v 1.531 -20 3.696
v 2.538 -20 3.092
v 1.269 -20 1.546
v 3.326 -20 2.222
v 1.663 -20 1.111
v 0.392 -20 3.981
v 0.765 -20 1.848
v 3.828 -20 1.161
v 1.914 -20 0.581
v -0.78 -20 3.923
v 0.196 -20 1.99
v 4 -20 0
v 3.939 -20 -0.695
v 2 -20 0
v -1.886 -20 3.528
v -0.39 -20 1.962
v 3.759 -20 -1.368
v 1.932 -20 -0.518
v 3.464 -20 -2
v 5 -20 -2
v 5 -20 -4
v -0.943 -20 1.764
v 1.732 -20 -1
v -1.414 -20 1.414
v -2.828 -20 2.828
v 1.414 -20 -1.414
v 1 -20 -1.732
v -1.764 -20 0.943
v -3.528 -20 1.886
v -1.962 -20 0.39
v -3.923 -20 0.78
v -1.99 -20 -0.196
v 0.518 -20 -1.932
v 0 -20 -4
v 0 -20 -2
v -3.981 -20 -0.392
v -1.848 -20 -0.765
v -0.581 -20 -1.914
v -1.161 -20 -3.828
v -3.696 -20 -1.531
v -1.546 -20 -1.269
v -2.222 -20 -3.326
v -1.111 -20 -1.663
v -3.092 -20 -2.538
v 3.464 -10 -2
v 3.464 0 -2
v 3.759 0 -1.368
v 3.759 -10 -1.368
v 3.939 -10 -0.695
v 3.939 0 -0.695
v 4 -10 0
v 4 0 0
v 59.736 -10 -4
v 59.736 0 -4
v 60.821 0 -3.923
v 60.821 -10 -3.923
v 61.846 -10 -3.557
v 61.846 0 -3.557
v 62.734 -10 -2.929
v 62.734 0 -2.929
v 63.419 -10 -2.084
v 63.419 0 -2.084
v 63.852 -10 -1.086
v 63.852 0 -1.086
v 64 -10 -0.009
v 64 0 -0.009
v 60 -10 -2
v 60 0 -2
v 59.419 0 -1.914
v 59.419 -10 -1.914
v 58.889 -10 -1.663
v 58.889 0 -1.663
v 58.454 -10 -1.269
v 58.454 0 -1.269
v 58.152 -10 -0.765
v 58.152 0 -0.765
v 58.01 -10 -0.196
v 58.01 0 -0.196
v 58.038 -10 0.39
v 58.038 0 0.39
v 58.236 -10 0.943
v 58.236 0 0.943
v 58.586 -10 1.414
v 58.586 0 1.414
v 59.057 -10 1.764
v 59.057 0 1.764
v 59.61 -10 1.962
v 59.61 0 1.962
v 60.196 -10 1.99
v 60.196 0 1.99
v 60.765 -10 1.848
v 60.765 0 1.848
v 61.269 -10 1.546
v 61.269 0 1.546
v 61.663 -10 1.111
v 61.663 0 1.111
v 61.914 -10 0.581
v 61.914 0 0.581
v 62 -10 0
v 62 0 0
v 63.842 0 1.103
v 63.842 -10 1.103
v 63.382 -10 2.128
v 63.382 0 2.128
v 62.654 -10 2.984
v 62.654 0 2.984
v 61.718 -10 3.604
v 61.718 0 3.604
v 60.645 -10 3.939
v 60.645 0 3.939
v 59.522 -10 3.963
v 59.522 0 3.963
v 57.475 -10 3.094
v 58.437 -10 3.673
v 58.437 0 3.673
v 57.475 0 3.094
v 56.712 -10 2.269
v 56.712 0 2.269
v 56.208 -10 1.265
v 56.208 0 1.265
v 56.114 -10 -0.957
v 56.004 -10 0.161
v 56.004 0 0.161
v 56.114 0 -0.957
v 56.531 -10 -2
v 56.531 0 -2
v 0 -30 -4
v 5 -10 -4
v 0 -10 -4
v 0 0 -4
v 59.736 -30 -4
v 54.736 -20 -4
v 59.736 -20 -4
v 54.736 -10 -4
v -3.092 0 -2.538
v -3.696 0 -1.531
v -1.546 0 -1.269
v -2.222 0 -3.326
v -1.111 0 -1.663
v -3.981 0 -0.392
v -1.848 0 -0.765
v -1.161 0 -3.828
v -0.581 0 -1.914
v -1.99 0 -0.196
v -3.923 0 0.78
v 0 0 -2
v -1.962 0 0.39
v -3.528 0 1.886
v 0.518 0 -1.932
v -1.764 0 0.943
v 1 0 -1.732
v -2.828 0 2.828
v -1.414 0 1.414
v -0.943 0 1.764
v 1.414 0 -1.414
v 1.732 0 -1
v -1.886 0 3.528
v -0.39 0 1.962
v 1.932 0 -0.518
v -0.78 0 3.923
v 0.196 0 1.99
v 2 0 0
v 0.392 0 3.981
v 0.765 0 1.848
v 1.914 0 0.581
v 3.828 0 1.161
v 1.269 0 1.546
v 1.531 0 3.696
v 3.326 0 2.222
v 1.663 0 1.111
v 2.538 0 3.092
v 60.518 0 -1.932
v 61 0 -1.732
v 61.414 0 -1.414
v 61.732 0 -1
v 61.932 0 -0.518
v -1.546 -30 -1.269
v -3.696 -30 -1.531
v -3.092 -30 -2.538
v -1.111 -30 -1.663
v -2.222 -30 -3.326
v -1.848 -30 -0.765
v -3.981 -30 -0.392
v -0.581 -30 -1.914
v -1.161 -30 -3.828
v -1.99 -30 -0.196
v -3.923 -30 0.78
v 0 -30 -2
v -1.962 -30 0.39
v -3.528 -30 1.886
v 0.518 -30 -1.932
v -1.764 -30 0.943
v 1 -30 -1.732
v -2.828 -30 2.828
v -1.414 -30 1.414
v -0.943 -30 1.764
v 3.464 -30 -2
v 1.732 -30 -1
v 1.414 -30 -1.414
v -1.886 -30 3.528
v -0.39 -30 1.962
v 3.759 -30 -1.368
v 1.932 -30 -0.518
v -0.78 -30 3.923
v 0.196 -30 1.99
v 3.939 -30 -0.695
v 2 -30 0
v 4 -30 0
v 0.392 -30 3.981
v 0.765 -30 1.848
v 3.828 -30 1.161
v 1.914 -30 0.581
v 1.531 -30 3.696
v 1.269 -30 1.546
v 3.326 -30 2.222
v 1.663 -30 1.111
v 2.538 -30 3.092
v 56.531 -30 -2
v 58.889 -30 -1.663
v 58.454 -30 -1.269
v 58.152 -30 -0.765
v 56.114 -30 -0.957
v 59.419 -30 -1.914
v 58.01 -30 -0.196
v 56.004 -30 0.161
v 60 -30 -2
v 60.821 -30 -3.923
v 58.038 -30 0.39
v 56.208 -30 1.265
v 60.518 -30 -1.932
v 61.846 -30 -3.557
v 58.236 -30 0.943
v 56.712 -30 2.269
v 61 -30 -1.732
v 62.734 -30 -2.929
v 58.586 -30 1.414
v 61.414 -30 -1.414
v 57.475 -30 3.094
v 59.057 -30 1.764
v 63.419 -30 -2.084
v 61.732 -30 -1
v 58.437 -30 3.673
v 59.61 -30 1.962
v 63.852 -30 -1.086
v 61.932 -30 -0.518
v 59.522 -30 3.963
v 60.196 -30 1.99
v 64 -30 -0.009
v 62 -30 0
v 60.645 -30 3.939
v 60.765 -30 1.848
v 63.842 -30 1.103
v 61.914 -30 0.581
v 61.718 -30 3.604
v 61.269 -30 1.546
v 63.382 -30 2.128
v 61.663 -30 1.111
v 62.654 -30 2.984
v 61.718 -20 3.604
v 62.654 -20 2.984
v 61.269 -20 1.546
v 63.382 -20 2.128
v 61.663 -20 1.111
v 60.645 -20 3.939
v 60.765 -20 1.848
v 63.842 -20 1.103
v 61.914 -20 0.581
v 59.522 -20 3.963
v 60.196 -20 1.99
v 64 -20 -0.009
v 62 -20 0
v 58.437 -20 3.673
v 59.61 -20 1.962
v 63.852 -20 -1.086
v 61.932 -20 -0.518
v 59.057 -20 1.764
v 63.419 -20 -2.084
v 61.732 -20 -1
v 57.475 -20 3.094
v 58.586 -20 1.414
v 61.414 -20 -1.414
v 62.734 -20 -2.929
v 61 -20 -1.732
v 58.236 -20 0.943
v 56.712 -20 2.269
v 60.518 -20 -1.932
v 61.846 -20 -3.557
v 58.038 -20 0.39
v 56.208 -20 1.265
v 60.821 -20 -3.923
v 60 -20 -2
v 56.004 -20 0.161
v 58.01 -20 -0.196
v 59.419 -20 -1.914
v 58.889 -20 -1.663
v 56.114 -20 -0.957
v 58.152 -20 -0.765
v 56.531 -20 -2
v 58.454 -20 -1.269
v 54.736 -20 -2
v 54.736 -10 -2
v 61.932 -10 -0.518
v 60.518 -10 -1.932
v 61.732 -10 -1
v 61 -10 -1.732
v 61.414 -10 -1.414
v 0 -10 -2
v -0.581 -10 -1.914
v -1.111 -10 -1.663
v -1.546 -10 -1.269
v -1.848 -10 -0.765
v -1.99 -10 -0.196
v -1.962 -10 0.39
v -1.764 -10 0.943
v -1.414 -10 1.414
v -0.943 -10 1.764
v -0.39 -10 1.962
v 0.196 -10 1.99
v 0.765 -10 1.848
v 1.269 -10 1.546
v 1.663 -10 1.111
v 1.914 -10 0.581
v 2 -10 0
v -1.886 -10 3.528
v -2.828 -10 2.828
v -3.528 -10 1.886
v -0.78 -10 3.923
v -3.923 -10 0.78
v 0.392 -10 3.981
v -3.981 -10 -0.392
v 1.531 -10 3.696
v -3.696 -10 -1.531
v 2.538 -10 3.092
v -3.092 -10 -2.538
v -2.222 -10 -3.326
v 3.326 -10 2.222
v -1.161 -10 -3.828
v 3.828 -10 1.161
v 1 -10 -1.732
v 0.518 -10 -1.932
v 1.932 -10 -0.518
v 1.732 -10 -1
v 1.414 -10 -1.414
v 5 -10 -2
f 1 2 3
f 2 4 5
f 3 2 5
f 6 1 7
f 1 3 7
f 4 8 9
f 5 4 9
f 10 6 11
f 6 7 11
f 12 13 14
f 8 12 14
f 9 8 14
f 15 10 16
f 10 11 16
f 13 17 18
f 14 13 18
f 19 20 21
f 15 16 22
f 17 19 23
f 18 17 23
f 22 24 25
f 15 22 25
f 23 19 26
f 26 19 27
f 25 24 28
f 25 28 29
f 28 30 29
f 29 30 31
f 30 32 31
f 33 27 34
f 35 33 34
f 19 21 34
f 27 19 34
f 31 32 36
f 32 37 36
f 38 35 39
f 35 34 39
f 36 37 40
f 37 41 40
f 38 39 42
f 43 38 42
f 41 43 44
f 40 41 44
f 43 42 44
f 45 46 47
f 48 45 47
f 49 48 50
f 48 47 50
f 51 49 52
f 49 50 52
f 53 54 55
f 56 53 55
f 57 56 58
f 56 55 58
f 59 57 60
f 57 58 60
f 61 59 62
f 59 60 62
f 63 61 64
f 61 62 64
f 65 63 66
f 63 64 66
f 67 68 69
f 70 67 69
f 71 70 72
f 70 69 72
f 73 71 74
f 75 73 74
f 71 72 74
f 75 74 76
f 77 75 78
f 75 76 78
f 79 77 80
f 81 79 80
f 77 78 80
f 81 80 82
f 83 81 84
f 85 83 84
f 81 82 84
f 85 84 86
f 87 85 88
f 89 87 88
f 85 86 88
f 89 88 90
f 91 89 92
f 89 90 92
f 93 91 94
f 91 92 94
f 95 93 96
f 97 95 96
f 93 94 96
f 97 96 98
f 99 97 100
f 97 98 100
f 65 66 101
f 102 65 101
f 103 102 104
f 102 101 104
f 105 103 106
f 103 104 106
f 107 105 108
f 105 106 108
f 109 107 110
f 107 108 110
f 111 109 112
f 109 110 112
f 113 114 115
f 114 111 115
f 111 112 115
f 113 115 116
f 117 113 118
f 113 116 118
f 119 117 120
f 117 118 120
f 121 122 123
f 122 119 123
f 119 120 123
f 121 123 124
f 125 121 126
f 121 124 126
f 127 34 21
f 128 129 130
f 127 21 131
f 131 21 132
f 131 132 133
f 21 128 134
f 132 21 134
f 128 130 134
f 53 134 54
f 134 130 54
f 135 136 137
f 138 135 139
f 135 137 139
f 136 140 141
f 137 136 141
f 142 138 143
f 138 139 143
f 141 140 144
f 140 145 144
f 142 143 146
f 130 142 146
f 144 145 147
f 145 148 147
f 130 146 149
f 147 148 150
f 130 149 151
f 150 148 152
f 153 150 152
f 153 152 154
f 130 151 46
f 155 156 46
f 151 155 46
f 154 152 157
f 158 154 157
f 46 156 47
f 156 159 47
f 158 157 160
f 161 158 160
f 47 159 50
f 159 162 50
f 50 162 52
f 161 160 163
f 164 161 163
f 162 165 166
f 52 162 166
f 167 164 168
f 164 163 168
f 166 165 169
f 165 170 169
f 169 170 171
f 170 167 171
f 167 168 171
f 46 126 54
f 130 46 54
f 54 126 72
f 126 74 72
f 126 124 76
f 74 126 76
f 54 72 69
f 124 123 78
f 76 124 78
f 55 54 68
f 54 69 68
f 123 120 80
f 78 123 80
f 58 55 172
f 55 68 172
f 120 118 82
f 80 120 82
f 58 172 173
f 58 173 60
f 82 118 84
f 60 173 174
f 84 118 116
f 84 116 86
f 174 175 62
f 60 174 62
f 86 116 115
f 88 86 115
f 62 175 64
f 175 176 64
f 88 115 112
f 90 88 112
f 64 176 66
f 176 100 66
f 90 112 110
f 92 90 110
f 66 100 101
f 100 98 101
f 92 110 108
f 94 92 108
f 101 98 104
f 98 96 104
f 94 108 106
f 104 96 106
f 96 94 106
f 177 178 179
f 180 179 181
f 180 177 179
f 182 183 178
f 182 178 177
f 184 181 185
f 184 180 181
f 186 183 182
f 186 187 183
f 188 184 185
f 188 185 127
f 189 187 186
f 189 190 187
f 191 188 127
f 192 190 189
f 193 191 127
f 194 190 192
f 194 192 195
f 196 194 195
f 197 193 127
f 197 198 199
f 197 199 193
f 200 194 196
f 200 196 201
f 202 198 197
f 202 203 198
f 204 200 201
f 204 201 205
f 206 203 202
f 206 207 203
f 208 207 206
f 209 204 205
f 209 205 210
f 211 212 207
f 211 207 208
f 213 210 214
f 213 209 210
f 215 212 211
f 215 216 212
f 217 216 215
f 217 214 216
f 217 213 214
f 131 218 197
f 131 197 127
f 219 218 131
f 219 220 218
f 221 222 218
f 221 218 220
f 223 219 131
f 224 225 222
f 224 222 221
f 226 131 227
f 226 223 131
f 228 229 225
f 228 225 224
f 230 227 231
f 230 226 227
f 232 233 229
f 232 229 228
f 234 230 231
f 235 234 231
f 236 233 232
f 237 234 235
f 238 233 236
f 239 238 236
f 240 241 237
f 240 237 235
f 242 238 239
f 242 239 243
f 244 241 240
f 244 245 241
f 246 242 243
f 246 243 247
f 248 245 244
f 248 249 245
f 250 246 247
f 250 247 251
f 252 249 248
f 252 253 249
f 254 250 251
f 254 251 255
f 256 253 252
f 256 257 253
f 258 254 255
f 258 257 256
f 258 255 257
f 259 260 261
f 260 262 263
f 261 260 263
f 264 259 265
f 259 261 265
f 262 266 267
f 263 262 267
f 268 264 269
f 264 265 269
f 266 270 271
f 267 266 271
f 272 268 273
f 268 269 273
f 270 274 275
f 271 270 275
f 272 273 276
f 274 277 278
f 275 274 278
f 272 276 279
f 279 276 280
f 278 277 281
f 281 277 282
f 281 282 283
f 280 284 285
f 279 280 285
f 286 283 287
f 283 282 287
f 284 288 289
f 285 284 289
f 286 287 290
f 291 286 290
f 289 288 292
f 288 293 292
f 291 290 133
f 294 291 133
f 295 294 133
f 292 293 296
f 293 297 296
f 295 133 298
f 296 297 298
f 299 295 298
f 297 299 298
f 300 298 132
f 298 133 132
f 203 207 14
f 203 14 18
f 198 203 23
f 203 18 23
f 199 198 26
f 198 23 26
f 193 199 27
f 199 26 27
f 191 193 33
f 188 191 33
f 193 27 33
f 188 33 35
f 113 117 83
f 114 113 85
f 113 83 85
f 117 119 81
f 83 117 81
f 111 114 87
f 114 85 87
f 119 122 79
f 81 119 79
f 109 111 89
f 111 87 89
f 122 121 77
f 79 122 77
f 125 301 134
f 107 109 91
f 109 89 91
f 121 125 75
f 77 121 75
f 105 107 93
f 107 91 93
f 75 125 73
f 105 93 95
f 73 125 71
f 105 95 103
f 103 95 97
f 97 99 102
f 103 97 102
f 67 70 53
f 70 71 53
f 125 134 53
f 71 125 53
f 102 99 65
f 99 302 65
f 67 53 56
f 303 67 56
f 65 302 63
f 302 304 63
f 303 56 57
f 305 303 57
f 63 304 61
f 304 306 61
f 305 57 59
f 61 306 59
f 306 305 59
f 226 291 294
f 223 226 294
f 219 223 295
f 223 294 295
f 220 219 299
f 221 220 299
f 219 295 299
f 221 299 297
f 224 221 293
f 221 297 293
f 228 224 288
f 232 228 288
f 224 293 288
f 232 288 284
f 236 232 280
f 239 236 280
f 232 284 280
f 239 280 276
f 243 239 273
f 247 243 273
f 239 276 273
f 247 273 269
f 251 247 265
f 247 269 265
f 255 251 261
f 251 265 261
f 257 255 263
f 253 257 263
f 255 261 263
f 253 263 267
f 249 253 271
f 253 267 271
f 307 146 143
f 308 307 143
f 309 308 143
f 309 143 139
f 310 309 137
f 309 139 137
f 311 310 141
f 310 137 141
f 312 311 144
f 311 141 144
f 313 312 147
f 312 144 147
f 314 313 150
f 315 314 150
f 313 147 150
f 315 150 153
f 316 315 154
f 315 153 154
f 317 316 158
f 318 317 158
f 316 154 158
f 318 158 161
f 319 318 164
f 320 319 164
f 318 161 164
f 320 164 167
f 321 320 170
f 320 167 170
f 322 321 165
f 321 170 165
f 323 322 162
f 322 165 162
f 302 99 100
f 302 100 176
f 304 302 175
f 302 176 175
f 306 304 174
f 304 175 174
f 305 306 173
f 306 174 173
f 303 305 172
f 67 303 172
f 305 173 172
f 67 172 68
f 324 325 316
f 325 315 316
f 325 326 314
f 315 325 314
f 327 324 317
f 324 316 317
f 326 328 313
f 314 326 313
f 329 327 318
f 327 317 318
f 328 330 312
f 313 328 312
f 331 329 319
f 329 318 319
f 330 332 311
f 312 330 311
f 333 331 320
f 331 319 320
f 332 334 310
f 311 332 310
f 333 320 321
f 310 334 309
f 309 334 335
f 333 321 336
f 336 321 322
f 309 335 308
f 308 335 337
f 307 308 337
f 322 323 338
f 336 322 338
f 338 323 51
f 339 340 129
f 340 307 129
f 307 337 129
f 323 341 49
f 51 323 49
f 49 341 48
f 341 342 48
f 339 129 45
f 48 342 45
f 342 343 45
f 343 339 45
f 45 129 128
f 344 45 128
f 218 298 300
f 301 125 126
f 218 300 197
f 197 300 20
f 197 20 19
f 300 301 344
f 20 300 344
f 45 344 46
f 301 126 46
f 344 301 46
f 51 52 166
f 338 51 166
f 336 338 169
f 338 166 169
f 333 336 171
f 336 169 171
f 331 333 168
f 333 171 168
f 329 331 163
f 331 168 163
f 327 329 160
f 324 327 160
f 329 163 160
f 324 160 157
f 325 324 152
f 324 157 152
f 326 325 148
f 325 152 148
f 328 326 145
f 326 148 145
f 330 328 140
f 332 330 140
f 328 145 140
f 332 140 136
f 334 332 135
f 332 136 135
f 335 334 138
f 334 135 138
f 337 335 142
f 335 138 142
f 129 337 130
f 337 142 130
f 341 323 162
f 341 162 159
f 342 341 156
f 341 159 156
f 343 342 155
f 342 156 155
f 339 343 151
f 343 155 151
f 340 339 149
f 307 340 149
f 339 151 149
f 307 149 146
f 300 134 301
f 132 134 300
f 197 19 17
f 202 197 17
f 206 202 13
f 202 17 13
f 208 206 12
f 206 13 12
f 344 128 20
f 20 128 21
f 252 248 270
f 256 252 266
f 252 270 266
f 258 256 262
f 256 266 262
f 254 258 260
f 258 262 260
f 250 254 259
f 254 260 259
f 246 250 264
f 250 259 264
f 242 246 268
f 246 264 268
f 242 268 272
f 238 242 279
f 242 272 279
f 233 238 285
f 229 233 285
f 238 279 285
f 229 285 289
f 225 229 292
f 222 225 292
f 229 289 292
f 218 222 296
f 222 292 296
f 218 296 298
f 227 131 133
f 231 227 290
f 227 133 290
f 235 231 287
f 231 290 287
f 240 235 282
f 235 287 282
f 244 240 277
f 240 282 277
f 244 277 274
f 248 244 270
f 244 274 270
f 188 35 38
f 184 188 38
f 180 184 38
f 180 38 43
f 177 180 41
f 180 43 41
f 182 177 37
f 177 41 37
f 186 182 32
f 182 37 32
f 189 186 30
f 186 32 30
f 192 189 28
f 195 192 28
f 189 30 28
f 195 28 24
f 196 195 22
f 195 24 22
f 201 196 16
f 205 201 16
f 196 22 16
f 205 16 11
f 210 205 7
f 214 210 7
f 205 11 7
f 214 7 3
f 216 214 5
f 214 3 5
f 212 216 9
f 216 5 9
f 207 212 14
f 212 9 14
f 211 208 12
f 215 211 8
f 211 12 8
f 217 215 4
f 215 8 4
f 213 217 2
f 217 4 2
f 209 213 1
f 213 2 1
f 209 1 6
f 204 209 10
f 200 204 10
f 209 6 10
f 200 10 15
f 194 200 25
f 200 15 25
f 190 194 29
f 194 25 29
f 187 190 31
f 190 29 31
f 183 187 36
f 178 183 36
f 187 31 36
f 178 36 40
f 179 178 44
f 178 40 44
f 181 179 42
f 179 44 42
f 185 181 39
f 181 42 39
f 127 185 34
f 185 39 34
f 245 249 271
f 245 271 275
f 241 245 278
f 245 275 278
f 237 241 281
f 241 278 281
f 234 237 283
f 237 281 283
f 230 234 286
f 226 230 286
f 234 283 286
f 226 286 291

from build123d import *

# Parameters (mm, degrees)
F1_DEPTH = 30
F2_W     = 5
F2_H     = 10
F3_DEPTH = 25
F2_W_2   = 4
F4_DEPTH = 25


with BuildPart() as f1:
    # F0 (on Front) → F1 (new body)
    with BuildSketch(Plane.XZ):
        with BuildLine():
            Line((0, -2), (0, -4))
            ThreePointArc((0, -4), (2, -3.4641016151), (3.4641016151, -2))
            Line((3.4641016151, -2), (0, -2))
        make_face()
        with BuildLine():
            ThreePointArc((3.4641016151, -2), (2, -3.4641016151), (0, -4))
            Line((0, -4), (59.7362193561, -4))
            ThreePointArc((59.7362193561, -4), (57.8825422961, -3.4022855387), (56.5308853543, -2))
            Line((56.5308853543, -2), (3.4641016151, -2))
        make_face()
        with BuildLine():
            ThreePointArc((56.5308853543, -2), (57.8825422961, -3.4022855387), (59.7362193561, -4))
            Line((59.7362193561, -4), (60, -4))
            Line((60, -4), (60, -2))
            Line((60, -2), (56.5308853543, -2))
        make_face()
        with BuildLine():
            Line((60, -4), (59.7362193561, -4))
            ThreePointArc((59.7362193561, -4), (62.7335757758, -2.9289055908), (63.9999993682, -0.0087069633))
            ThreePointArc((63.9999993682, -0.0087069633), (58.9695761678, 3.8562934285), (56.5308853543, -2))
            Line((56.5308853543, -2), (60, -2))
            Line((60, -2), (60, -4))
        make_face()
        with BuildLine():
            ThreePointArc((62, 0), (61.4142135624, -1.4142135624), (60, -2))
            ThreePointArc((60, -2), (58.5857864376, 1.4142135624), (62, 0))
        make_face(mode=Mode.SUBTRACT)
        with BuildLine():
            ThreePointArc((3.4641016151, -2), (3.8637033052, -1.0352761804), (4, 0))
            ThreePointArc((4, 0), (-2.8284271247, 2.8284271247), (0, -4))
            Line((0, -4), (0, -2))
            Line((0, -2), (3.4641016151, -2))
        make_face()
        with BuildLine():
            ThreePointArc((2, 0), (1.4142135624, -1.4142135624), (0, -2))
            ThreePointArc((0, -2), (-1.4142135624, 1.4142135624), (2, 0))
        make_face(mode=Mode.SUBTRACT)
    extrude(amount=F1_DEPTH)

    # F2 (on face) → F3 (cut, symmetric)
    with BuildSketch(Plane(origin=(0, 0, -4), x_dir=(1, 0, 0), z_dir=(0, 0, -1))):
        with Locations((57.2362193561, 15)):
            Rectangle(F2_W, F2_H)
        with Locations((62.2362193561, 15)):
            Rectangle(F2_W, F2_H)
    extrude(amount=F3_DEPTH, both=True, mode=Mode.SUBTRACT)

    # F2 (on face) → F4 (cut, symmetric)
    with BuildSketch(Plane(origin=(0, 0, -4), x_dir=(1, 0, 0), z_dir=(0, 0, -1))):
        with Locations((-2, 15)):
            Rectangle(F2_W_2, F2_H)
        with Locations((2.5, 15)):
            Rectangle(F2_W, F2_H)
    extrude(amount=F4_DEPTH, both=True, mode=Mode.SUBTRACT)


solid = f1.part
